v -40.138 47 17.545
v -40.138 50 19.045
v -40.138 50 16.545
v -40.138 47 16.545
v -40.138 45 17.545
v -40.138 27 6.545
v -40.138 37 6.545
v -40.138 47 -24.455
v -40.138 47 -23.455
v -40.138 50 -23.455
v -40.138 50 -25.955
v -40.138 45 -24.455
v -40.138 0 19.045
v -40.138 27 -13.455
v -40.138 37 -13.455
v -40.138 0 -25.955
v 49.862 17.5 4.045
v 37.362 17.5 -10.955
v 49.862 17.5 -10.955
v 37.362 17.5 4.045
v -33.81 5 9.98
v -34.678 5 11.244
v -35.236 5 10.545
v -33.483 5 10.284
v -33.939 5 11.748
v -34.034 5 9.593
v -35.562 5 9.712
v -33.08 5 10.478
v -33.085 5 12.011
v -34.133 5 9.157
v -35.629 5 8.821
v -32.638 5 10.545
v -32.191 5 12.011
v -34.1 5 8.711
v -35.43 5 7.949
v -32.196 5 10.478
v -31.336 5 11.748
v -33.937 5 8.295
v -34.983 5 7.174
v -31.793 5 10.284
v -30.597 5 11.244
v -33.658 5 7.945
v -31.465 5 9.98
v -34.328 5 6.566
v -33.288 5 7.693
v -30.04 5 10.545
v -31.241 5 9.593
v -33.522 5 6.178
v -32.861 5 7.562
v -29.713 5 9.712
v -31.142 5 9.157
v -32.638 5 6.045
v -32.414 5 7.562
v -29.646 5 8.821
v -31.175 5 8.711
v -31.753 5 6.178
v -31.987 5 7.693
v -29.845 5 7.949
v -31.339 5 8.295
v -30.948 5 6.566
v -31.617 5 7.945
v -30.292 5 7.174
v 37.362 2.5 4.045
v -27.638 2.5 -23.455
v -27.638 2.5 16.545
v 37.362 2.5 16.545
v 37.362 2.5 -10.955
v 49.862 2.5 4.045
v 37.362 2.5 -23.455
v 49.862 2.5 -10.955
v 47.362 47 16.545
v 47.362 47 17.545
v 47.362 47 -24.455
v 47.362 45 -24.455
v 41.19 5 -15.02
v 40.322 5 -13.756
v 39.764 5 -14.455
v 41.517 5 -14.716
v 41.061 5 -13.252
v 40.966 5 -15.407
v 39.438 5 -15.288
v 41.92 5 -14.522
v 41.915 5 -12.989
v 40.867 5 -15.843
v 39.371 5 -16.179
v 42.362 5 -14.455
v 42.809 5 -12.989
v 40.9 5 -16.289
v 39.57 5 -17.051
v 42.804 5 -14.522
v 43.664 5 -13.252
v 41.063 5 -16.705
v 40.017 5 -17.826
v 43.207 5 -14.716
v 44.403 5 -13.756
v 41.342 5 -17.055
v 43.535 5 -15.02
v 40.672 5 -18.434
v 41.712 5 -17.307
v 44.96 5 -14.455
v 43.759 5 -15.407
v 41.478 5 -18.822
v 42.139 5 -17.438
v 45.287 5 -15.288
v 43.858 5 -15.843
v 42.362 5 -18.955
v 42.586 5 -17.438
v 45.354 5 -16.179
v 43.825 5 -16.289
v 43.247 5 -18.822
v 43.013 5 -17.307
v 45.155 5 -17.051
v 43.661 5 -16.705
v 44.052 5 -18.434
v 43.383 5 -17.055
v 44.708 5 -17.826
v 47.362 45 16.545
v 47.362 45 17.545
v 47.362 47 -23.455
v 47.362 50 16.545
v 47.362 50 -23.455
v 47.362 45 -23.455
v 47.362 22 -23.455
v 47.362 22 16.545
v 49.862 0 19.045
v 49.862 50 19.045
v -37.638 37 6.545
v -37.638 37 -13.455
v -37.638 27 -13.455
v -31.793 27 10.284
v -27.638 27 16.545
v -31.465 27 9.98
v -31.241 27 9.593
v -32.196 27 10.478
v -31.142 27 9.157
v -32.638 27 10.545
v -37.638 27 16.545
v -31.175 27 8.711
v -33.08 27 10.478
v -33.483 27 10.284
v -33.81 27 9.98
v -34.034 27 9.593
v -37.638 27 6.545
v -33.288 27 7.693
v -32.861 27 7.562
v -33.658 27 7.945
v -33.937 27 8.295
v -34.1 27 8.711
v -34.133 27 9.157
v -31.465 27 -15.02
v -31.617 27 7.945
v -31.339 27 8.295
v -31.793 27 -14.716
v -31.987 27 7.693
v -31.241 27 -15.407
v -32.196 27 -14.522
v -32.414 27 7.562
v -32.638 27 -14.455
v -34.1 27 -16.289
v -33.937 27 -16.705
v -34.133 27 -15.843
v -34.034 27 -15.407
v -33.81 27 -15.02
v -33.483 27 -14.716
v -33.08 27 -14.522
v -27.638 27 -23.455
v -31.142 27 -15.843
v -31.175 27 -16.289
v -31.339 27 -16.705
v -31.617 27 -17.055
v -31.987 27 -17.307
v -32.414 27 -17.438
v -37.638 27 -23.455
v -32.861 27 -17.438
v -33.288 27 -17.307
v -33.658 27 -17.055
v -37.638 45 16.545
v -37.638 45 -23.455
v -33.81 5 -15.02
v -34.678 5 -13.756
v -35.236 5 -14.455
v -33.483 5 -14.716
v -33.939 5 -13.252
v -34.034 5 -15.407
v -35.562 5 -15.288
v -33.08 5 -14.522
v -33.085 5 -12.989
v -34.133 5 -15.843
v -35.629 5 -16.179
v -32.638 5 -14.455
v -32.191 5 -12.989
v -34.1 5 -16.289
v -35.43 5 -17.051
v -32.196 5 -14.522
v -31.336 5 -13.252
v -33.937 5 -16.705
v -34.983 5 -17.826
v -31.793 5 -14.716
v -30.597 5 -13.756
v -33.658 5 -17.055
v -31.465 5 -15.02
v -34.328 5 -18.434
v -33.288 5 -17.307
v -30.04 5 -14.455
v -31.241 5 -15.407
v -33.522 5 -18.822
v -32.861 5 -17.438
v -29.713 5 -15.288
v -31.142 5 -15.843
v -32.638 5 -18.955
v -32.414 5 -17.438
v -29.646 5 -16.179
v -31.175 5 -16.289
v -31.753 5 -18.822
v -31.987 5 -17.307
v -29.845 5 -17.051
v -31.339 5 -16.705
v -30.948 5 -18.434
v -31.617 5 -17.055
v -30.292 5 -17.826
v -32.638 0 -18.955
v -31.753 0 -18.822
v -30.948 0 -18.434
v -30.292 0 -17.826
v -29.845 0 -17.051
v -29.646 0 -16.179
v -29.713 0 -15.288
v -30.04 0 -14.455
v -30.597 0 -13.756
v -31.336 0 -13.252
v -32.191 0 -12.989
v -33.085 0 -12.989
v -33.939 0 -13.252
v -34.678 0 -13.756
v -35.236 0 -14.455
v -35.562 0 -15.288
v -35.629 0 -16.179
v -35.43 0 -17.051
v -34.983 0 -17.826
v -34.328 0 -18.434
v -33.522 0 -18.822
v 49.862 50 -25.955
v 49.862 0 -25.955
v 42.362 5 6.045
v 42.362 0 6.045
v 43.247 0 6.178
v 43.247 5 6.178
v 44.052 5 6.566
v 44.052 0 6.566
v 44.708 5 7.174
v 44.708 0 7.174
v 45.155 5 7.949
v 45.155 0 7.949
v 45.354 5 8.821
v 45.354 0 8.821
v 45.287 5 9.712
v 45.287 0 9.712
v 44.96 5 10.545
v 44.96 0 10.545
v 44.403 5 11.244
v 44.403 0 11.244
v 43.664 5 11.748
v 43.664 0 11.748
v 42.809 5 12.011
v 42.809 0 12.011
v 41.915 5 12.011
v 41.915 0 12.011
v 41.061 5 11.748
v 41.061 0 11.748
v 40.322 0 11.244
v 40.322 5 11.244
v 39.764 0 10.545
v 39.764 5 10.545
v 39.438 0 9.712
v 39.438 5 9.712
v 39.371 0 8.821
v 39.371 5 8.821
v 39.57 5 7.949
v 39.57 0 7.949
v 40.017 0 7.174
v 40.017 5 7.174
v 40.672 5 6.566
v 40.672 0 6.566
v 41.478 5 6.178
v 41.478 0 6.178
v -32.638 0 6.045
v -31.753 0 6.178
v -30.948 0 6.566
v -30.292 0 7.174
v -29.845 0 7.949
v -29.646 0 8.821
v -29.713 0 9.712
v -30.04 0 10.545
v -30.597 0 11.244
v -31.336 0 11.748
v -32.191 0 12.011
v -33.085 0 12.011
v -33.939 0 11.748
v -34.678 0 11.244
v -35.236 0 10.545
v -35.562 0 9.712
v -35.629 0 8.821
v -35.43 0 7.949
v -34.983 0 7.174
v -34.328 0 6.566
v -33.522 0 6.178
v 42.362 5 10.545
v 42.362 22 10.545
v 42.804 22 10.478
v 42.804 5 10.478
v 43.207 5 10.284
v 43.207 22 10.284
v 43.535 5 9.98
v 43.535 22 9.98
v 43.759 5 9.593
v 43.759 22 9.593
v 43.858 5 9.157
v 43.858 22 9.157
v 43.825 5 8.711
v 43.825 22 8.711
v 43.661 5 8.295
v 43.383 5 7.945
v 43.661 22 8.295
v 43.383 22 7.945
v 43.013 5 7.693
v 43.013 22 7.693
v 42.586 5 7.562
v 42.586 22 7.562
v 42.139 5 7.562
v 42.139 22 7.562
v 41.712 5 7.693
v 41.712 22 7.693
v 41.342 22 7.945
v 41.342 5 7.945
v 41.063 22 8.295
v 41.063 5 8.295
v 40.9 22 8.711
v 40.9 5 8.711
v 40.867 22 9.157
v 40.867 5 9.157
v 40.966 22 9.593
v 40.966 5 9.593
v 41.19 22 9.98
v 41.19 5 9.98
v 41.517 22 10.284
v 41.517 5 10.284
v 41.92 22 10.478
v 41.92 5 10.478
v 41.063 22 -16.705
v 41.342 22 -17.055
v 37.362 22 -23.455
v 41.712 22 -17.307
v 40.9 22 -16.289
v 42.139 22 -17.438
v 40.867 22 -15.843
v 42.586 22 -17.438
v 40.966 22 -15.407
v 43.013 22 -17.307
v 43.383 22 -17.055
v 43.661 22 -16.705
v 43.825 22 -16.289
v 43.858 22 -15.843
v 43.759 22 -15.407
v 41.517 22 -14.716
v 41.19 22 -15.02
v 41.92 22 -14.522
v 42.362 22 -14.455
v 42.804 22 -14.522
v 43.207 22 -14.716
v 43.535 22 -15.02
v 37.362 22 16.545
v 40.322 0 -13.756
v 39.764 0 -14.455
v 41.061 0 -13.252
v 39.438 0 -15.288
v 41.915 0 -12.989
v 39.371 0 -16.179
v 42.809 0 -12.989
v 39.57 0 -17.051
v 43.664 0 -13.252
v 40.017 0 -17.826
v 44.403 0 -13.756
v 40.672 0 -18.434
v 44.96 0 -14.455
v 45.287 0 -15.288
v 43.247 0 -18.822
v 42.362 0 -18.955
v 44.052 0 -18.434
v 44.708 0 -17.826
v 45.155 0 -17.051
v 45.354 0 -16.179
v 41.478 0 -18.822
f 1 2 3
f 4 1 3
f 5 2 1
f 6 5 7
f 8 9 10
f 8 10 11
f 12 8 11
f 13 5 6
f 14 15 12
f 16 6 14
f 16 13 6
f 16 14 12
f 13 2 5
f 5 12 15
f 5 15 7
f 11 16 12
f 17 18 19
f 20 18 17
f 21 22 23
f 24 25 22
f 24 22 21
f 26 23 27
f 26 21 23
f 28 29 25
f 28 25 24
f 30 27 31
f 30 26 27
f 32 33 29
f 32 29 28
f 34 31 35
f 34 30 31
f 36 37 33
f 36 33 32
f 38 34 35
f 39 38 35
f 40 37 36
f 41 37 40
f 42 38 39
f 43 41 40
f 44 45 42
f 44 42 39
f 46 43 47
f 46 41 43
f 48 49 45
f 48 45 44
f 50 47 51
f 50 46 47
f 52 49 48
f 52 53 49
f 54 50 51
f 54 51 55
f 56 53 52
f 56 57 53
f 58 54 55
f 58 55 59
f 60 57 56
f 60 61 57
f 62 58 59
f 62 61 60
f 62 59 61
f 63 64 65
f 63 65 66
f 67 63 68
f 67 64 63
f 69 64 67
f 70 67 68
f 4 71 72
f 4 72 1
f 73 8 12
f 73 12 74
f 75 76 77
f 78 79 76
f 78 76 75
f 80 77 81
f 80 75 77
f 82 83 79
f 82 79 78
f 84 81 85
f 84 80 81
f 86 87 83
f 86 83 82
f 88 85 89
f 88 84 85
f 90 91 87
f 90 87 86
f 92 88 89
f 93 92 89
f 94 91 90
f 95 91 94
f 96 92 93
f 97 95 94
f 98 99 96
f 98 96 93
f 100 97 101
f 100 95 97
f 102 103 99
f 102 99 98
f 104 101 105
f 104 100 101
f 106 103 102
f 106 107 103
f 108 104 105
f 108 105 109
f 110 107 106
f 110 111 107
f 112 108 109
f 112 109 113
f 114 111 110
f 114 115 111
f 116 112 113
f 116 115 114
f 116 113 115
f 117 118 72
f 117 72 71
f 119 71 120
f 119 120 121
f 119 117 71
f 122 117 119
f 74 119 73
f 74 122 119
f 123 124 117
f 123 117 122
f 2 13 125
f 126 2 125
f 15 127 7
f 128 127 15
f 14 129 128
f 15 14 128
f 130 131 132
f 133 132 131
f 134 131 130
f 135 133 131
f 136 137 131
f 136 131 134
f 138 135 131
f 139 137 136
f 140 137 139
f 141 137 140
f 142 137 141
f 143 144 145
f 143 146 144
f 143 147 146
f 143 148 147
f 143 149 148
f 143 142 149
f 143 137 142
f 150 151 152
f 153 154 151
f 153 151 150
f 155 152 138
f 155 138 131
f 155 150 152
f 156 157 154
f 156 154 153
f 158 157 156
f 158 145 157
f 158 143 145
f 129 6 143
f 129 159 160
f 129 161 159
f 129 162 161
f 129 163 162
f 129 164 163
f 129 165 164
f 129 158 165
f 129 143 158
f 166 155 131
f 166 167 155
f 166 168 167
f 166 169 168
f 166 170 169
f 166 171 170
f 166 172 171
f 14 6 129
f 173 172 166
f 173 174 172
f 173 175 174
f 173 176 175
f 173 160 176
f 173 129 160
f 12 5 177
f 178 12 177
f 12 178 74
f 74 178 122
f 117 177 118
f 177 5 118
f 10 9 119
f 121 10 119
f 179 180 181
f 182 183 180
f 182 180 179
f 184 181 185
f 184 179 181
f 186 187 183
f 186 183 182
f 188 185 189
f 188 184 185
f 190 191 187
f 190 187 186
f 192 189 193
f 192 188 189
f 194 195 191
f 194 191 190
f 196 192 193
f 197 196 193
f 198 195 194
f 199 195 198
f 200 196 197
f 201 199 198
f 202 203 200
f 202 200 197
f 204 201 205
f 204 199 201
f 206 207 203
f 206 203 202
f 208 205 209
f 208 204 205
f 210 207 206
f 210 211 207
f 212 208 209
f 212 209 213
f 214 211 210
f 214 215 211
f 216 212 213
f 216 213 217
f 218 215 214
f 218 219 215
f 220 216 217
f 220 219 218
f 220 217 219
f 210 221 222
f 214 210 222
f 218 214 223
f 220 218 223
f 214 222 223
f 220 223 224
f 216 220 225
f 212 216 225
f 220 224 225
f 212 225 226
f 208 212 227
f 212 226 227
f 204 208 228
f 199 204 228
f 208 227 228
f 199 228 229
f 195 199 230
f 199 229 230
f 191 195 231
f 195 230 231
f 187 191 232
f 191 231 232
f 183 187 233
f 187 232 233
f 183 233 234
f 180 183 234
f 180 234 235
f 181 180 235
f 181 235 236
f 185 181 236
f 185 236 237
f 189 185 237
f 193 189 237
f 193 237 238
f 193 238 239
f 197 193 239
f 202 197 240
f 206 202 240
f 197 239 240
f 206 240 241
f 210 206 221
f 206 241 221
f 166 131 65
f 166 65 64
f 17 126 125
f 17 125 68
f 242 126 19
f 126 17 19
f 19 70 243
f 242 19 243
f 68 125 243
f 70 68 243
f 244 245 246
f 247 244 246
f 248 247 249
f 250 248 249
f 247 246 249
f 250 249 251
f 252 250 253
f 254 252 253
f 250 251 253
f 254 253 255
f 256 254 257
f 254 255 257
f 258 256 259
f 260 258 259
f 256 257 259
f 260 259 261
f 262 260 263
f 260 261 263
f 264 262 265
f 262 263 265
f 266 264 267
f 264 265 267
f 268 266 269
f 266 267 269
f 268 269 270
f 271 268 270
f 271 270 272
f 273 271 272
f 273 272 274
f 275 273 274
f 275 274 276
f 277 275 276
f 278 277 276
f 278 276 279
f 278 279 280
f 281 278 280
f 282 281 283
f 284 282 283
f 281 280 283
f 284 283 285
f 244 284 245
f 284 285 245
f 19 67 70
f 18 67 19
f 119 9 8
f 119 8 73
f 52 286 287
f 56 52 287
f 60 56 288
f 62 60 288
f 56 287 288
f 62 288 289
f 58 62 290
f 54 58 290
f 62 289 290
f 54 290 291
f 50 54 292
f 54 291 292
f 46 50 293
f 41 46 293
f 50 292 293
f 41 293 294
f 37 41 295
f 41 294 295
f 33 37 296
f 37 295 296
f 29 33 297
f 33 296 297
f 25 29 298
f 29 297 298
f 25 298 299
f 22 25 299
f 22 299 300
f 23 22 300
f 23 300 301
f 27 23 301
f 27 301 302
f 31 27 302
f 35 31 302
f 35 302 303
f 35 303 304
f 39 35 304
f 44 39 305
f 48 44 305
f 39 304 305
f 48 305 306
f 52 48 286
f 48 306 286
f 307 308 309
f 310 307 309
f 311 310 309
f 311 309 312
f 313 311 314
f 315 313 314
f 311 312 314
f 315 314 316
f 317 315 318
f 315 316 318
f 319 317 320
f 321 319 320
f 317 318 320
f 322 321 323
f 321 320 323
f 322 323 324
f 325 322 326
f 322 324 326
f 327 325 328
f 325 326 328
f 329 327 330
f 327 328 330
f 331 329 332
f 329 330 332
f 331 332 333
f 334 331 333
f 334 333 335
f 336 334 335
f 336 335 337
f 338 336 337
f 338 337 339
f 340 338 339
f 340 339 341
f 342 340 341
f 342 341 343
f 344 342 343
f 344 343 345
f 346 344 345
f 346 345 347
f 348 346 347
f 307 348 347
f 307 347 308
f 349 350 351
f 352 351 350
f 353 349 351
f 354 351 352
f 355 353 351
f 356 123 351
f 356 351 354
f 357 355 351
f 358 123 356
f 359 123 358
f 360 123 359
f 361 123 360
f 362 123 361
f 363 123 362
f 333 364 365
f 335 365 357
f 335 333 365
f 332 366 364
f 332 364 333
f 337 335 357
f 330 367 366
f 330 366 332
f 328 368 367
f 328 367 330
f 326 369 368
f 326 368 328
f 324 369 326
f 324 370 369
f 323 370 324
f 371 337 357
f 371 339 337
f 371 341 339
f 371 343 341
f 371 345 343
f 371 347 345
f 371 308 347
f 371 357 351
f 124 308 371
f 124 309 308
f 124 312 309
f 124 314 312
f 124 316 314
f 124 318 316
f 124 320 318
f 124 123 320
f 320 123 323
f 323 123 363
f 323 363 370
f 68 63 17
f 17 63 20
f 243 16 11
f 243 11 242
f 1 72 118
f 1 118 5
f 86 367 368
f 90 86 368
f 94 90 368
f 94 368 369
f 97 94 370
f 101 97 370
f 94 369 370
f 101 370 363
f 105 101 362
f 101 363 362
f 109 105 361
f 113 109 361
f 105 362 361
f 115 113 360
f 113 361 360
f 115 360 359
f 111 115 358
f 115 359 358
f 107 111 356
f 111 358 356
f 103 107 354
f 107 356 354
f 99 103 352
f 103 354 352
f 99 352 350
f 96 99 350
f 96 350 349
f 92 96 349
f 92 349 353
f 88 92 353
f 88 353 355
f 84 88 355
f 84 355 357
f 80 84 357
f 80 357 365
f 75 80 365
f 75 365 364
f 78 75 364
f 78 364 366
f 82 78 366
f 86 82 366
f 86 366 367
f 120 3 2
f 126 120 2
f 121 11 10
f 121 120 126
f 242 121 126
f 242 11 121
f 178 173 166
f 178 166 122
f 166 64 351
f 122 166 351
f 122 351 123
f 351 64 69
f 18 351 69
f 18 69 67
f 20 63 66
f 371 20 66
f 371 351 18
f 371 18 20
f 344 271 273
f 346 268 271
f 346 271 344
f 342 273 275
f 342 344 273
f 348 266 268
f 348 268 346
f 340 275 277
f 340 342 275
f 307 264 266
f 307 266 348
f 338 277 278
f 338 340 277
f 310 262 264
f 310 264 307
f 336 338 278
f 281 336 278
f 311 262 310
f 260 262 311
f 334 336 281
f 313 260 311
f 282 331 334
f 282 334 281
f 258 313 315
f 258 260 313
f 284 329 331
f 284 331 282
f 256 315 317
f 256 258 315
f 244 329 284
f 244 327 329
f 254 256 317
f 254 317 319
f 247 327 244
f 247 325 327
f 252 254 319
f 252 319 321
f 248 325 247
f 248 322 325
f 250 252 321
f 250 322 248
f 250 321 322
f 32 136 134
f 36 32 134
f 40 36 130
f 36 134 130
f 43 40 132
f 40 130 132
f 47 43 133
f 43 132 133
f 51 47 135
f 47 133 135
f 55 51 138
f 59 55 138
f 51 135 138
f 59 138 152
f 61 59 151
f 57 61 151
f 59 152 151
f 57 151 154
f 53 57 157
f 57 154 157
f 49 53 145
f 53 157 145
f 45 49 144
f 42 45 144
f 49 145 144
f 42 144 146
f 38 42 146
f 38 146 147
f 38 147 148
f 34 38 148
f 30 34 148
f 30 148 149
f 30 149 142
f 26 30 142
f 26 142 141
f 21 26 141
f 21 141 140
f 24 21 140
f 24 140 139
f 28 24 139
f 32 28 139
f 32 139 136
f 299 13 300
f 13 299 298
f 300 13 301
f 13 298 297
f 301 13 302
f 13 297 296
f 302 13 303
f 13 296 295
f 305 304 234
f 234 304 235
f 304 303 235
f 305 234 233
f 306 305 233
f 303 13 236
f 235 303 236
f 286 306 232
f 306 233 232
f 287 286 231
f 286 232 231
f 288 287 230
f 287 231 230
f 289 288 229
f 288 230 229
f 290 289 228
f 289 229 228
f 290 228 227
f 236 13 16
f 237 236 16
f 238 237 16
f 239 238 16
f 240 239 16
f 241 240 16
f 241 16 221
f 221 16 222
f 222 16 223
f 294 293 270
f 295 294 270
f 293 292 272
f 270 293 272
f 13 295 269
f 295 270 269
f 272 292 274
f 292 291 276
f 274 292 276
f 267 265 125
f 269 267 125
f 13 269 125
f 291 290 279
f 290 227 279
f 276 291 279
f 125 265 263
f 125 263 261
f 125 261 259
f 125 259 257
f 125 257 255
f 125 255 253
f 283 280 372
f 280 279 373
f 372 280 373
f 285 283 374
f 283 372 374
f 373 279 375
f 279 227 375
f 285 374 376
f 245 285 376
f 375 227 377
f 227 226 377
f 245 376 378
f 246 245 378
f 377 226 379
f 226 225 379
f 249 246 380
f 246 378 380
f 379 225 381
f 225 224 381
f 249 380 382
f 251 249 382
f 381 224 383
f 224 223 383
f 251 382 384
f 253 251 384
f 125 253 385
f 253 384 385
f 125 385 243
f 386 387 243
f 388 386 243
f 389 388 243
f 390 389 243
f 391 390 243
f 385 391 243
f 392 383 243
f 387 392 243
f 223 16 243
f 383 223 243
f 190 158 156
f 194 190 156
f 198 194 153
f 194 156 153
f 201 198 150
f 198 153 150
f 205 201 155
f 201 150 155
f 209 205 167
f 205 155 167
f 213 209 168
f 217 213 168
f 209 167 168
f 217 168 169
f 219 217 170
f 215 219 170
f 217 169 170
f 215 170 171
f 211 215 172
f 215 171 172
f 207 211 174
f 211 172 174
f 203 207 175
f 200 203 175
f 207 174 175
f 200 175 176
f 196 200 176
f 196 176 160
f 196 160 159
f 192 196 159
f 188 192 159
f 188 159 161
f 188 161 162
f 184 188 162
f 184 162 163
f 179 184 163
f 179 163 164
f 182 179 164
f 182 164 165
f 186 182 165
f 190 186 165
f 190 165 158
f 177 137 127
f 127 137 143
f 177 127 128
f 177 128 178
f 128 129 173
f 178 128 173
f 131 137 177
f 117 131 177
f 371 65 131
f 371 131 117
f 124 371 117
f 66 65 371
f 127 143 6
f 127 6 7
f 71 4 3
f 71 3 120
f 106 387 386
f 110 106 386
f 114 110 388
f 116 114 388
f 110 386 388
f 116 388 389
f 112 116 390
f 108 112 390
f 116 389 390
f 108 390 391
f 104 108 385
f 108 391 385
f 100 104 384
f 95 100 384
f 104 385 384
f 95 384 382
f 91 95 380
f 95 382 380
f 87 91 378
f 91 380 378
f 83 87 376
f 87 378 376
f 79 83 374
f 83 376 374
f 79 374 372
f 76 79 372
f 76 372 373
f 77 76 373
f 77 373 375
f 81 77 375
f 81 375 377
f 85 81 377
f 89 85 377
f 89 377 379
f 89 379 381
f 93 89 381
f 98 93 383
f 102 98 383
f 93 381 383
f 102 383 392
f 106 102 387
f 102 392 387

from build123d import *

# Parameters (mm, degrees)
SKETCH1_W           = 90
SKETCH1_H           = 45
BOSS_EXTRUDE1_DEPTH = 50
SHELL1_T            = -2.5
SKETCH2_W           = 40
SKETCH2_H           = 24.5
BOSS_EXTRUDE2_DEPTH = 10
SKETCH3_W           = 40
SKETCH3_H           = 19.5
BOSS_EXTRUDE3_DEPTH = 10
SKETCH9_W           = 20
SKETCH9_H           = 10
CUT_EXTRUDE3_DEPTH  = 2.5
SKETCH13_W          = 40
SKETCH13_H          = 5
CUT_EXTRUDE6_DEPTH  = 2.5
SKETCH14_W          = 87.5
SKETCH14_H          = 2
CUT_EXTRUDE7_DEPTH  = 1
SKETCH15_W          = 87.5
SKETCH15_H          = 2
CUT_EXTRUDE8_DEPTH  = 1
SKETCH17_R          = 1.5
CUT_EXTRUDE9_DEPTH  = 27
SKETCH18_R          = 1.5
CUT_EXTRUDE10_DEPTH = 27
SKETCH20_R          = 1.5
CUT_EXTRUDE11_DEPTH = 22
SKETCH21_R          = 1.5
CUT_EXTRUDE12_DEPTH = 22
SKETCH22_R          = 3
CUT_EXTRUDE13_DEPTH = 5
SKETCH26_W          = 15
SKETCH26_H          = 15
CUT_EXTRUDE14_DEPTH = 12.5


with BuildPart() as part:
    # Sketch1 → Boss-Extrude1 (new body)
    with BuildSketch(Plane(origin=(0, 0, 0), x_dir=(1, 0, 0), z_dir=(0, 1, 0))):
        with Locations((4.862356655, 3.4550978)):
            Rectangle(SKETCH1_W, SKETCH1_H)
    extrude(amount=BOSS_EXTRUDE1_DEPTH)

    # Shell1
    shell1_openings = [part.faces().sort_by_distance(p)[0] for p in [
        (4.862356655, 50, -3.4550978),
    ]]
    offset(amount=SHELL1_T, openings=shell1_openings, kind=Kind.INTERSECTION)

    # Sketch2 → Boss-Extrude2 (add)
    with BuildSketch(Plane(origin=(-37.637643345, 0, 0), x_dir=(0, 0, -1), z_dir=(1, 0, 0))):
        with Locations((3.4550978, 14.75)):
            Rectangle(SKETCH2_W, SKETCH2_H)
    extrude(amount=BOSS_EXTRUDE2_DEPTH)

    # Sketch3 → Boss-Extrude3 (add)
    with BuildSketch(Plane.ZY.offset(-47.362356655)):
        with Locations((-3.4550978, 12.25)):
            Rectangle(SKETCH3_W, SKETCH3_H)
    extrude(amount=BOSS_EXTRUDE3_DEPTH)

    # Sketch9 → Cut-Extrude3 (cut)
    with BuildSketch(Plane(origin=(-37.637643345, 0, 0), x_dir=(0, 0, -1), z_dir=(1, 0, 0))):
        with Locations((3.4550978, 32)):
            Rectangle(SKETCH9_W, SKETCH9_H)
    extrude(amount=-CUT_EXTRUDE3_DEPTH, mode=Mode.SUBTRACT)

    # Sketch13 → Cut-Extrude6 (cut)
    with BuildSketch(Plane(origin=(-37.637643345, 0, 0), x_dir=(0, 0, -1), z_dir=(1, 0, 0))):
        with Locations((3.4550978, 47.5)):
            Rectangle(SKETCH13_W, SKETCH13_H)
    extrude(amount=-CUT_EXTRUDE6_DEPTH, mode=Mode.SUBTRACT)

    # Sketch14 → Cut-Extrude7 (cut)
    with BuildSketch(Plane.XY.offset(-23.4550978)):
        with Locations((3.612356655, 46)):
            Rectangle(SKETCH14_W, SKETCH14_H)
    extrude(amount=-CUT_EXTRUDE7_DEPTH, mode=Mode.SUBTRACT)

    # Sketch15 → Cut-Extrude8 (cut)
    with BuildSketch(Plane(origin=(0, 0, 16.5449022), x_dir=(-1, 0, 0), z_dir=(0, 0, -1))):
        with Locations((-3.612356655, 46)):
            Rectangle(SKETCH15_W, SKETCH15_H)
    extrude(amount=-CUT_EXTRUDE8_DEPTH, mode=Mode.SUBTRACT)

    # Sketch17 → Cut-Extrude9 (cut)
    with BuildSketch(Plane(origin=(0, 27, 0), x_dir=(1, 0, 0), z_dir=(0, 1, 0))):
        with Locations(Location((-32.637643345, -9.0449022, 0), (0, 0, 270))):
            Circle(SKETCH17_R)
    extrude(amount=-CUT_EXTRUDE9_DEPTH, mode=Mode.SUBTRACT)

    # Sketch18 → Cut-Extrude10 (cut)
    with BuildSketch(Plane(origin=(0, 27, 0), x_dir=(1, 0, 0), z_dir=(0, 1, 0))):
        with Locations(Location((-32.637643345, 15.9550978, 0), (0, 0, 270))):
            Circle(SKETCH18_R)
    extrude(amount=-CUT_EXTRUDE10_DEPTH, mode=Mode.SUBTRACT)

    # Sketch20 → Cut-Extrude11 (cut)
    with BuildSketch(Plane(origin=(0, 22, 0), x_dir=(1, 0, 0), z_dir=(0, 1, 0))):
        with Locations(Location((42.362356655, 15.9550978, 0), (0, 0, 270))):
            Circle(SKETCH20_R)
    extrude(amount=-CUT_EXTRUDE11_DEPTH, mode=Mode.SUBTRACT)

    # Sketch21 → Cut-Extrude12 (cut)
    with BuildSketch(Plane(origin=(0, 22, 0), x_dir=(1, 0, 0), z_dir=(0, 1, 0))):
        with Locations(Location((42.362356655, -9.0449022, 0), (0, 0, 270))):
            Circle(SKETCH21_R)
    extrude(amount=-CUT_EXTRUDE12_DEPTH, mode=Mode.SUBTRACT)

    # Sketch22 → Cut-Extrude13 (cut)
    with BuildSketch(Plane.XZ):
        with Locations(Location((-32.637643345, -15.9550978, 0), (0, 0, 270))):
            Circle(SKETCH22_R)
        with Locations(Location((-32.637643345, 9.0449022, 0), (0, 0, 270))):
            Circle(SKETCH22_R)
        with Locations(Location((42.362356655, -15.9550978, 0), (0, 0, 270))):
            Circle(SKETCH22_R)
        with Locations(Location((42.362356655, 9.0449022, 0), (0, 0, 270))):
            Circle(SKETCH22_R)
    extrude(amount=-CUT_EXTRUDE13_DEPTH, mode=Mode.SUBTRACT)

    # Sketch26 → Cut-Extrude14 (cut)
    with BuildSketch(Plane.ZY.offset(-37.362356655)):
        with Locations((-3.4550978, 10)):
            Rectangle(SKETCH26_W, SKETCH26_H)
    extrude(amount=-CUT_EXTRUDE14_DEPTH, mode=Mode.SUBTRACT)


solid = part.part
